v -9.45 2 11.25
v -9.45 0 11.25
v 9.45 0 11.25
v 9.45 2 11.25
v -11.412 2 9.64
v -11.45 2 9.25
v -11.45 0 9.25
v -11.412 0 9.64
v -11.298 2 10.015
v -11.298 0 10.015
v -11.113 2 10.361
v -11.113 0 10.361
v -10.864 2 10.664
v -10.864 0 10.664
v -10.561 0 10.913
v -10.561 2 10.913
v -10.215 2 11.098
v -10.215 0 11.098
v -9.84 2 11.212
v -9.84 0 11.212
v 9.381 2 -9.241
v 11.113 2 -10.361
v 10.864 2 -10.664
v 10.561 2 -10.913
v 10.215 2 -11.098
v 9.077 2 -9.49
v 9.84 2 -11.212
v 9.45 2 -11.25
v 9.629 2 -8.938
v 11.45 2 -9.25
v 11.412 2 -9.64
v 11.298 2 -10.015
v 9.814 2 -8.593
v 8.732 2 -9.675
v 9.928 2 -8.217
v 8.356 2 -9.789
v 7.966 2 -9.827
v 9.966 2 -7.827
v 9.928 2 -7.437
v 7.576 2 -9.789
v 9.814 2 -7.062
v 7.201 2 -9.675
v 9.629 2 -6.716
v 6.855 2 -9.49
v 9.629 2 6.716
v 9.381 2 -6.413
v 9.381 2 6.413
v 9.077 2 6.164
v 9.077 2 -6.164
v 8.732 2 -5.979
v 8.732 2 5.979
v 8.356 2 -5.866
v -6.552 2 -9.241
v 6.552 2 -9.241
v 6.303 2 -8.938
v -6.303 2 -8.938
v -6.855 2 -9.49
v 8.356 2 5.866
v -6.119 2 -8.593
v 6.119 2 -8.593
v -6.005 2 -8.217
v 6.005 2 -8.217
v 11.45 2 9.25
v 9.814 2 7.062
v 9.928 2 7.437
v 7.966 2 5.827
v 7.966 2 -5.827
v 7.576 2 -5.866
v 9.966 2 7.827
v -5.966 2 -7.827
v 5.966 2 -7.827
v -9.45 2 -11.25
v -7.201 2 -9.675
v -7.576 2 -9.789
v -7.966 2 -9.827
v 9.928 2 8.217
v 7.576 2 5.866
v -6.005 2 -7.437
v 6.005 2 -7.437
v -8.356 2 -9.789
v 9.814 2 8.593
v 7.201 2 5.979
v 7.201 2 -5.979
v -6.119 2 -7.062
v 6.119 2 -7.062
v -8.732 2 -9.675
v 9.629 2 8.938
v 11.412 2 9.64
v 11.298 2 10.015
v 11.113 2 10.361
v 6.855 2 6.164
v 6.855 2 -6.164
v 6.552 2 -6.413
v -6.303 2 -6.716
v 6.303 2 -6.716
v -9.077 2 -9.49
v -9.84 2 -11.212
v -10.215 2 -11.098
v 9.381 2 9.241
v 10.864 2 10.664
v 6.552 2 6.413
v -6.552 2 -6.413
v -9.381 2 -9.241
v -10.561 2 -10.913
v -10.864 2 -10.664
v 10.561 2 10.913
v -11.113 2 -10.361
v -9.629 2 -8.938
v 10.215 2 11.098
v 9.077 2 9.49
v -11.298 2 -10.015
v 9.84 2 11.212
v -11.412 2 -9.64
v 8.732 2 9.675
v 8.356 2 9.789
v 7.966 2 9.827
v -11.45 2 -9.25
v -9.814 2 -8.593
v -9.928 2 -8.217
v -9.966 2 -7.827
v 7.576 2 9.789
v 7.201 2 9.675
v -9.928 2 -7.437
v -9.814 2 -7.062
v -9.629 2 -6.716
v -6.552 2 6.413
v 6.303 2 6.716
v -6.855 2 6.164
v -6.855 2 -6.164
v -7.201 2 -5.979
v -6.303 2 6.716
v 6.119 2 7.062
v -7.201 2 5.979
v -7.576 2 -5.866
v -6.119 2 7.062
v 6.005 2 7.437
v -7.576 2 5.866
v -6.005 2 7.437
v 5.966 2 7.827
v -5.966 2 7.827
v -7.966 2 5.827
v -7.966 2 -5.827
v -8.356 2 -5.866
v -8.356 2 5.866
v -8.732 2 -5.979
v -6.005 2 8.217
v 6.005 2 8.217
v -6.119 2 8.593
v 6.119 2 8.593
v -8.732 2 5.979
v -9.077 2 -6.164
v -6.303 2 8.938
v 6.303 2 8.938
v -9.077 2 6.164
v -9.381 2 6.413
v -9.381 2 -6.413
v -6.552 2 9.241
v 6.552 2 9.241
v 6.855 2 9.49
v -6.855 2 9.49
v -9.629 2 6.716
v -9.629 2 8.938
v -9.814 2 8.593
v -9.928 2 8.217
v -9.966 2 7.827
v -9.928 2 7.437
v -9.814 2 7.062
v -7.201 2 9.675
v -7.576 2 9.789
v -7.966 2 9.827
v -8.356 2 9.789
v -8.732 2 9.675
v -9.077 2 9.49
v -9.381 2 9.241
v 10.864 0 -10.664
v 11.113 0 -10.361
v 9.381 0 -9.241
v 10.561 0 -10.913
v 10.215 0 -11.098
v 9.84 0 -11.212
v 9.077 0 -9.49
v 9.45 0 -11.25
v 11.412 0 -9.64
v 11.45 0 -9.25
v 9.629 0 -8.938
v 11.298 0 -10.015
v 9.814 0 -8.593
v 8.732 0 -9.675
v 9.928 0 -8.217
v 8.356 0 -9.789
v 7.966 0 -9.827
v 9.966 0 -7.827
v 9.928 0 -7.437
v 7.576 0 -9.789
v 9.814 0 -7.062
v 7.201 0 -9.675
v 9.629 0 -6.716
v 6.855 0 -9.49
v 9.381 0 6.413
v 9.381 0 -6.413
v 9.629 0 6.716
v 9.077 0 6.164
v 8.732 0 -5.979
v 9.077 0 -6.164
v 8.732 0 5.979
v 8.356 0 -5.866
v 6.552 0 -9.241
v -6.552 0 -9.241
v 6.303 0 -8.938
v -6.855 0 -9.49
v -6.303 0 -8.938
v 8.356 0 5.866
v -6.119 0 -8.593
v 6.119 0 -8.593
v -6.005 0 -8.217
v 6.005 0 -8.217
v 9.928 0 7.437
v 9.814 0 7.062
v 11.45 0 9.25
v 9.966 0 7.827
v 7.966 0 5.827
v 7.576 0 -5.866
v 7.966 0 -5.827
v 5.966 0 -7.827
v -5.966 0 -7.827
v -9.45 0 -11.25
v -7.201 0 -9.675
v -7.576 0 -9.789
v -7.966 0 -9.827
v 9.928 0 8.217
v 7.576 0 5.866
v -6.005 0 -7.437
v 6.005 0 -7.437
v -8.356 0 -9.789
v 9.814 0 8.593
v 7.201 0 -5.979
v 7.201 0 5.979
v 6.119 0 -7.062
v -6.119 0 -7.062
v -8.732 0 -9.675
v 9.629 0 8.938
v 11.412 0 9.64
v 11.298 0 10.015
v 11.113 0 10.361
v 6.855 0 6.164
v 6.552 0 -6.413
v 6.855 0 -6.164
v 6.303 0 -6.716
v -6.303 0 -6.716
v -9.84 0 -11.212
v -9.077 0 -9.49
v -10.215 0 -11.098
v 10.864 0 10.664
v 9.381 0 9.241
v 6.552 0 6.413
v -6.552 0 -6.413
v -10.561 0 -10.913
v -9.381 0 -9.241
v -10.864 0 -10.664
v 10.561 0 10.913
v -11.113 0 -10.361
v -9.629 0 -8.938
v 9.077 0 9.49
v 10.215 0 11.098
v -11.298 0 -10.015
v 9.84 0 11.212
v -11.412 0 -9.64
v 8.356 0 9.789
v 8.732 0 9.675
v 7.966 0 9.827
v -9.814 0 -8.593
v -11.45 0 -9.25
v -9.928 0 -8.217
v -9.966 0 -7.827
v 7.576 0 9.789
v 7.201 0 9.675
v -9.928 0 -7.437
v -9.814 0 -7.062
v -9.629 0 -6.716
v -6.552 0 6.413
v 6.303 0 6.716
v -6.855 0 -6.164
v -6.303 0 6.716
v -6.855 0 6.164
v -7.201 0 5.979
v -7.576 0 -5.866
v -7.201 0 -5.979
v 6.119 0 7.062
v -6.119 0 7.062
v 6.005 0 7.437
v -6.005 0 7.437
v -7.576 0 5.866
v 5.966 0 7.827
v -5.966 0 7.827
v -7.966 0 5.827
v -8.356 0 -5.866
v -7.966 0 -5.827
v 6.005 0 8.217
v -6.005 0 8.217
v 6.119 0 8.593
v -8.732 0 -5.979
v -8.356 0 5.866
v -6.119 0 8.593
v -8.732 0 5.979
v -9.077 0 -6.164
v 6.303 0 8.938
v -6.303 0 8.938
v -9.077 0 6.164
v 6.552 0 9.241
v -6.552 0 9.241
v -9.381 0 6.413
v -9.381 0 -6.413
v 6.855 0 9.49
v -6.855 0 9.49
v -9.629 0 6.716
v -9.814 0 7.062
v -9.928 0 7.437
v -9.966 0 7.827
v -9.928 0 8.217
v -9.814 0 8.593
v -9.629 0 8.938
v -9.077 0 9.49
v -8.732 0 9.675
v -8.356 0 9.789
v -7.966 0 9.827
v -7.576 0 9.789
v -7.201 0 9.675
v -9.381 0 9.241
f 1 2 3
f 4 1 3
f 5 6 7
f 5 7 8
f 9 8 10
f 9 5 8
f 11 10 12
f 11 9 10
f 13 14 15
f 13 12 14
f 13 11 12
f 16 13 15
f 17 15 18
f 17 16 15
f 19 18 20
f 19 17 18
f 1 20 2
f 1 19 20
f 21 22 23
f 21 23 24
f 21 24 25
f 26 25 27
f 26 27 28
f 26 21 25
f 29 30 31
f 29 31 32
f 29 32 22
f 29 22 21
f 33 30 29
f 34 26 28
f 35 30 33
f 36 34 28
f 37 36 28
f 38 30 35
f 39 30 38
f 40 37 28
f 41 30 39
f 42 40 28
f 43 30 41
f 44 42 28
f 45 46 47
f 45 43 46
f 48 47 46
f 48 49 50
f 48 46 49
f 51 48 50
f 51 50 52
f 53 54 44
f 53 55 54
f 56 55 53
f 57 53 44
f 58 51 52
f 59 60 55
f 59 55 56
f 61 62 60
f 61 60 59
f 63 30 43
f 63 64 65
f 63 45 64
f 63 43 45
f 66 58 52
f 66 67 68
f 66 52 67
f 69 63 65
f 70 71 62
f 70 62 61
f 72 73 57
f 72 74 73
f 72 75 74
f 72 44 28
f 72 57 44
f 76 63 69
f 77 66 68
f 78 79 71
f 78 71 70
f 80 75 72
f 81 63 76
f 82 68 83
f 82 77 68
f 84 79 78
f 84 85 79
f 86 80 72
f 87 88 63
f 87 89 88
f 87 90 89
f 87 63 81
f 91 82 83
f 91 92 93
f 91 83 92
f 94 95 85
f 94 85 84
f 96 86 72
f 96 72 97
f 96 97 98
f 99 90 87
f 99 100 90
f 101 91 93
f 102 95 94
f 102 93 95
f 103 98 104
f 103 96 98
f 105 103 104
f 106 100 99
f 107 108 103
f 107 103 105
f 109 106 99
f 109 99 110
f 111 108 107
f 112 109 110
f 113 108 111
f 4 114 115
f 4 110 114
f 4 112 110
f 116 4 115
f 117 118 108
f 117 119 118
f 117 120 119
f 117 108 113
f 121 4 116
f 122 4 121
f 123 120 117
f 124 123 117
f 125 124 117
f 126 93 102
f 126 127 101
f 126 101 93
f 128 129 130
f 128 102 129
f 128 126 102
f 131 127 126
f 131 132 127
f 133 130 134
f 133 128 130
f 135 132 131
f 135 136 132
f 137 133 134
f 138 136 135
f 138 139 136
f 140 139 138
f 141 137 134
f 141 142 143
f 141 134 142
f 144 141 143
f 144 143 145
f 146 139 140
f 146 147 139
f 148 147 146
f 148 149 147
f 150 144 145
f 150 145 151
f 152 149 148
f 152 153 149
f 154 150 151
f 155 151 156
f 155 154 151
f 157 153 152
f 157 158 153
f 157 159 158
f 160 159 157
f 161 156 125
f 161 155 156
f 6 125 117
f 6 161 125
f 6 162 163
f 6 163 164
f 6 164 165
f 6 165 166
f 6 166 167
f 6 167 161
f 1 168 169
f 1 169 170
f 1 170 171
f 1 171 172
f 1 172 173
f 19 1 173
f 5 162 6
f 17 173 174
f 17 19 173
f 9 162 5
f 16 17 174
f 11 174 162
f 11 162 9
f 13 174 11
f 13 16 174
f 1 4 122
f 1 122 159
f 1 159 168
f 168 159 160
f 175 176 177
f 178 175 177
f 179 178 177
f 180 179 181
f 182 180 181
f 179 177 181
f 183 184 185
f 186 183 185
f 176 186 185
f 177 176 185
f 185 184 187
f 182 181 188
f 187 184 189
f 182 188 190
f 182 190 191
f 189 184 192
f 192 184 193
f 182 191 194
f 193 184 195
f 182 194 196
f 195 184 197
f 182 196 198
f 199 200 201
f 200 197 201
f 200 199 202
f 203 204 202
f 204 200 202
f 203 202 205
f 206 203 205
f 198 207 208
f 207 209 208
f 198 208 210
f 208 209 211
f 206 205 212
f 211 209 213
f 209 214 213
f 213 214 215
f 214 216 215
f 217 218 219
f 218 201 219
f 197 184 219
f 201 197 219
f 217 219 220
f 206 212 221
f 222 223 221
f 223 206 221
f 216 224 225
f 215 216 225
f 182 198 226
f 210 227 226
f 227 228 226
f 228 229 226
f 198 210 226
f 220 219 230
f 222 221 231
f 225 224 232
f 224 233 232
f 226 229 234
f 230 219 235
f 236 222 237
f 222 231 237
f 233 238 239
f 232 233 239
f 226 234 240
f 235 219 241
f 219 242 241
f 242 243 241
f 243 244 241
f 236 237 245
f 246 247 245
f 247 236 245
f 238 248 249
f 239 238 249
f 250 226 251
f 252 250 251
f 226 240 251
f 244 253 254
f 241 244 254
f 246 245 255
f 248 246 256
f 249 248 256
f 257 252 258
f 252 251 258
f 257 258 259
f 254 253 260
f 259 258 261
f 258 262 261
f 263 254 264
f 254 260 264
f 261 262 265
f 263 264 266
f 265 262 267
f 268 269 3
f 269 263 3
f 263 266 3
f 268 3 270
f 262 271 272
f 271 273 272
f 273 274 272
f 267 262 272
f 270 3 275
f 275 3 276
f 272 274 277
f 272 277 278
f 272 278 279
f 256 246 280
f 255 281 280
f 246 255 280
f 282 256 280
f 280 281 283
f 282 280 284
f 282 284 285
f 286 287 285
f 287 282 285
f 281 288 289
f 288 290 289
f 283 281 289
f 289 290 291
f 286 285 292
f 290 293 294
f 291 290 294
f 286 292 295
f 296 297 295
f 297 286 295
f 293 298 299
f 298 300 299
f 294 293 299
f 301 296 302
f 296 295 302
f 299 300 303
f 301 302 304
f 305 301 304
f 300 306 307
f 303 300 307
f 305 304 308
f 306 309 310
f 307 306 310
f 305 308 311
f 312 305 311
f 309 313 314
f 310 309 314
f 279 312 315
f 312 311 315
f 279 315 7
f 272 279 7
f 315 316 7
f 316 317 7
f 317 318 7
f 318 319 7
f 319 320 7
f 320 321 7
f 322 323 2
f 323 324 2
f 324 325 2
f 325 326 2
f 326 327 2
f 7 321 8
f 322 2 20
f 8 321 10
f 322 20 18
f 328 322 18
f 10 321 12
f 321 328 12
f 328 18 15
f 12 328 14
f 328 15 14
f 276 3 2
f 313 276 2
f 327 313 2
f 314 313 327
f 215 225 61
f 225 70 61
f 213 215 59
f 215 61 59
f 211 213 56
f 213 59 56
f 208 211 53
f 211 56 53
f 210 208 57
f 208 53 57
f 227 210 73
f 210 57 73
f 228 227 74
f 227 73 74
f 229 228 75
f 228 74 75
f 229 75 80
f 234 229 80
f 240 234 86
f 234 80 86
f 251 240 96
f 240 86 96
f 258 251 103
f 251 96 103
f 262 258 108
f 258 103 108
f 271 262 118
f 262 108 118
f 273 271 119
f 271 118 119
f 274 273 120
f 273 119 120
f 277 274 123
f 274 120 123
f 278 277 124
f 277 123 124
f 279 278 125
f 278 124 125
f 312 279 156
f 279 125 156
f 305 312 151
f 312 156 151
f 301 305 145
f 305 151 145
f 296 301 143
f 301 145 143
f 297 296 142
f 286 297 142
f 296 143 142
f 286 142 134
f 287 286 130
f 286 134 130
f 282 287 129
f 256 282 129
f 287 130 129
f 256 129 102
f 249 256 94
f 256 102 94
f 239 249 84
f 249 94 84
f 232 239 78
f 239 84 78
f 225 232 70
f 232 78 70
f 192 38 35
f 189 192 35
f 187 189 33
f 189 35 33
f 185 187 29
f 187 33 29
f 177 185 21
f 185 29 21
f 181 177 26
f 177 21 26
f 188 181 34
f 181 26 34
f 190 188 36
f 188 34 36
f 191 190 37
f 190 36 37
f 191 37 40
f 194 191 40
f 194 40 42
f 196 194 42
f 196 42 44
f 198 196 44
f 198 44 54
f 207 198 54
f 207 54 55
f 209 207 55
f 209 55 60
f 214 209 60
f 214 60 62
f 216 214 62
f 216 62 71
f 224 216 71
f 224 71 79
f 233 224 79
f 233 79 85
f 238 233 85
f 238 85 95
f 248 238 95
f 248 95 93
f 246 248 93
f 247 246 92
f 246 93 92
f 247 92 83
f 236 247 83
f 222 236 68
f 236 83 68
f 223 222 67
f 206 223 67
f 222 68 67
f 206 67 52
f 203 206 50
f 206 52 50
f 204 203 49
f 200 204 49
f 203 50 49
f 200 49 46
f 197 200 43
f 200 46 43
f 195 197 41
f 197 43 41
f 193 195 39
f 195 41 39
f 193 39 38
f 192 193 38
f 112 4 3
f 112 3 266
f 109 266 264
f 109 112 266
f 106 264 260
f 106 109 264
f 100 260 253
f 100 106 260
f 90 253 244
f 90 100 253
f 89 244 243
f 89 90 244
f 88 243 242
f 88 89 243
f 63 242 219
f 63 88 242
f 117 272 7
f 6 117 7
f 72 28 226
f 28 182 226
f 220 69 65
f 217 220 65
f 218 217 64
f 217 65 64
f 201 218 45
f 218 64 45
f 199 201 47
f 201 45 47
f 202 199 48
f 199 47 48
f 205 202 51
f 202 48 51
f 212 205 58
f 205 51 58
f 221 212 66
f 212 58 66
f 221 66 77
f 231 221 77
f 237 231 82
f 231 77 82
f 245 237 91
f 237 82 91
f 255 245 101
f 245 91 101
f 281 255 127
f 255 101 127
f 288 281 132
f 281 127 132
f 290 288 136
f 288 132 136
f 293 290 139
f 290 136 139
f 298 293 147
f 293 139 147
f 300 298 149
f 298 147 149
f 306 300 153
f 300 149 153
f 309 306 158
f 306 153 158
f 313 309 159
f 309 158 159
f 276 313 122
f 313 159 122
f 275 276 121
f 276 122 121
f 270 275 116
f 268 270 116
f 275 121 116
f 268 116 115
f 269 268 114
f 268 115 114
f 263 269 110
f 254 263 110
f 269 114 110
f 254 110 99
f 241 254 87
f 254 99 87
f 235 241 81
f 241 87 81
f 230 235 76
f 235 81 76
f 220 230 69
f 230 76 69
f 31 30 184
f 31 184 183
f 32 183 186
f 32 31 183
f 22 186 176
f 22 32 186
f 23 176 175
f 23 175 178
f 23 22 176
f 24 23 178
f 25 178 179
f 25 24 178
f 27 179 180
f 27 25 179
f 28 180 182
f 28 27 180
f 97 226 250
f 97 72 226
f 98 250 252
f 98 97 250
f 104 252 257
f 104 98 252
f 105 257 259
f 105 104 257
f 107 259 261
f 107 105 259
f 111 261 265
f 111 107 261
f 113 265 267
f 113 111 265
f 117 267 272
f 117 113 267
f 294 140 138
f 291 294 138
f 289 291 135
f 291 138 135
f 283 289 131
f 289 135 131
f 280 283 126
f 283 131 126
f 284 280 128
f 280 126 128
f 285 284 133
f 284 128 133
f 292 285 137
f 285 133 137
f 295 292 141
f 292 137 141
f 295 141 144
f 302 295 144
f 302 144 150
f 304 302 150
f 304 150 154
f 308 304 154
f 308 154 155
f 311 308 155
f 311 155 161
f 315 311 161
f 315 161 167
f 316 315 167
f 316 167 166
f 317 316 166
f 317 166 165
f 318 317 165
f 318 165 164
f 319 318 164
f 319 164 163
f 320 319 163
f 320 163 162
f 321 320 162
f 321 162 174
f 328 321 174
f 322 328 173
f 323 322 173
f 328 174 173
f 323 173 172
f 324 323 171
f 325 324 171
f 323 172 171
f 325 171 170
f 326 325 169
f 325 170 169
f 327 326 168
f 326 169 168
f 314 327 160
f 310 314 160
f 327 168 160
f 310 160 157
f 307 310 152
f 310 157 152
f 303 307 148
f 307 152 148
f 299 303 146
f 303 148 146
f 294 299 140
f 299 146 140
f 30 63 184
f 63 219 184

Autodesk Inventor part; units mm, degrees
ref_plane "XZ Plane" through (0, 0, 0) normal (0, 1, 0) x (-1, 0, 0)
sketch "Эскиз1" plane through (0, 0, 0) normal (0, 1, 0) x (-1, 0, 0)
  line L0 (-11.45, -11.25) -> (11.45, -11.25)
  line L1 (11.45, -11.25) -> (11.45, 11.25)
  line L2 (11.45, 11.25) -> (-11.45, 11.25)
  line L3 (-11.45, 11.25) -> (-11.45, -11.25)
  line L4 (-11.45, -11.25) -> (11.45, 11.25) construction
  line L5 (11.45, -11.25) -> (-11.45, 11.25) construction
  point P0 (0, 0)
  dimension "d0" = 22.5
  dimension "d1" = 22.9
extrude "Выдавливание1" add sketch "Эскиз1" along normal blind 2
sketch "Эскиз2" plane through (0, 2, 0) normal (0, 1, 0) x (1, 0, 0)
  line L0 (-11.45, 11.25) -> (-11.45, -11.25) projected
  line L1 (-11.45, -11.25) -> (0, 0)
  circle A0 centre (-7.9663, -7.8272) radius 2
  line L2 (15.4928, 0) -> (-16.8416, 0)
  line L3 (0, -16.9938) -> (0, 16.458)
  circle A1 centre (-7.9663, 7.8272) radius 2
  circle A2 centre (7.9663, -7.8272) radius 2
  circle A3 centre (7.9663, 7.8272) radius 2
  dimension "d8" = 4
extrude "Выдавливание2" cut sketch "Эскиз2" against normal blind 2 contours A0 L1 | L1 A0 | A1 | A2 | A3
fillet "Сопряжение1" radius 2 4 edges at (-11.45, 1, 11.25) (11.45, 1, 11.25) (11.45, 1, -11.25) (-11.45, 1, -11.25)
properties part number "энкодер"
